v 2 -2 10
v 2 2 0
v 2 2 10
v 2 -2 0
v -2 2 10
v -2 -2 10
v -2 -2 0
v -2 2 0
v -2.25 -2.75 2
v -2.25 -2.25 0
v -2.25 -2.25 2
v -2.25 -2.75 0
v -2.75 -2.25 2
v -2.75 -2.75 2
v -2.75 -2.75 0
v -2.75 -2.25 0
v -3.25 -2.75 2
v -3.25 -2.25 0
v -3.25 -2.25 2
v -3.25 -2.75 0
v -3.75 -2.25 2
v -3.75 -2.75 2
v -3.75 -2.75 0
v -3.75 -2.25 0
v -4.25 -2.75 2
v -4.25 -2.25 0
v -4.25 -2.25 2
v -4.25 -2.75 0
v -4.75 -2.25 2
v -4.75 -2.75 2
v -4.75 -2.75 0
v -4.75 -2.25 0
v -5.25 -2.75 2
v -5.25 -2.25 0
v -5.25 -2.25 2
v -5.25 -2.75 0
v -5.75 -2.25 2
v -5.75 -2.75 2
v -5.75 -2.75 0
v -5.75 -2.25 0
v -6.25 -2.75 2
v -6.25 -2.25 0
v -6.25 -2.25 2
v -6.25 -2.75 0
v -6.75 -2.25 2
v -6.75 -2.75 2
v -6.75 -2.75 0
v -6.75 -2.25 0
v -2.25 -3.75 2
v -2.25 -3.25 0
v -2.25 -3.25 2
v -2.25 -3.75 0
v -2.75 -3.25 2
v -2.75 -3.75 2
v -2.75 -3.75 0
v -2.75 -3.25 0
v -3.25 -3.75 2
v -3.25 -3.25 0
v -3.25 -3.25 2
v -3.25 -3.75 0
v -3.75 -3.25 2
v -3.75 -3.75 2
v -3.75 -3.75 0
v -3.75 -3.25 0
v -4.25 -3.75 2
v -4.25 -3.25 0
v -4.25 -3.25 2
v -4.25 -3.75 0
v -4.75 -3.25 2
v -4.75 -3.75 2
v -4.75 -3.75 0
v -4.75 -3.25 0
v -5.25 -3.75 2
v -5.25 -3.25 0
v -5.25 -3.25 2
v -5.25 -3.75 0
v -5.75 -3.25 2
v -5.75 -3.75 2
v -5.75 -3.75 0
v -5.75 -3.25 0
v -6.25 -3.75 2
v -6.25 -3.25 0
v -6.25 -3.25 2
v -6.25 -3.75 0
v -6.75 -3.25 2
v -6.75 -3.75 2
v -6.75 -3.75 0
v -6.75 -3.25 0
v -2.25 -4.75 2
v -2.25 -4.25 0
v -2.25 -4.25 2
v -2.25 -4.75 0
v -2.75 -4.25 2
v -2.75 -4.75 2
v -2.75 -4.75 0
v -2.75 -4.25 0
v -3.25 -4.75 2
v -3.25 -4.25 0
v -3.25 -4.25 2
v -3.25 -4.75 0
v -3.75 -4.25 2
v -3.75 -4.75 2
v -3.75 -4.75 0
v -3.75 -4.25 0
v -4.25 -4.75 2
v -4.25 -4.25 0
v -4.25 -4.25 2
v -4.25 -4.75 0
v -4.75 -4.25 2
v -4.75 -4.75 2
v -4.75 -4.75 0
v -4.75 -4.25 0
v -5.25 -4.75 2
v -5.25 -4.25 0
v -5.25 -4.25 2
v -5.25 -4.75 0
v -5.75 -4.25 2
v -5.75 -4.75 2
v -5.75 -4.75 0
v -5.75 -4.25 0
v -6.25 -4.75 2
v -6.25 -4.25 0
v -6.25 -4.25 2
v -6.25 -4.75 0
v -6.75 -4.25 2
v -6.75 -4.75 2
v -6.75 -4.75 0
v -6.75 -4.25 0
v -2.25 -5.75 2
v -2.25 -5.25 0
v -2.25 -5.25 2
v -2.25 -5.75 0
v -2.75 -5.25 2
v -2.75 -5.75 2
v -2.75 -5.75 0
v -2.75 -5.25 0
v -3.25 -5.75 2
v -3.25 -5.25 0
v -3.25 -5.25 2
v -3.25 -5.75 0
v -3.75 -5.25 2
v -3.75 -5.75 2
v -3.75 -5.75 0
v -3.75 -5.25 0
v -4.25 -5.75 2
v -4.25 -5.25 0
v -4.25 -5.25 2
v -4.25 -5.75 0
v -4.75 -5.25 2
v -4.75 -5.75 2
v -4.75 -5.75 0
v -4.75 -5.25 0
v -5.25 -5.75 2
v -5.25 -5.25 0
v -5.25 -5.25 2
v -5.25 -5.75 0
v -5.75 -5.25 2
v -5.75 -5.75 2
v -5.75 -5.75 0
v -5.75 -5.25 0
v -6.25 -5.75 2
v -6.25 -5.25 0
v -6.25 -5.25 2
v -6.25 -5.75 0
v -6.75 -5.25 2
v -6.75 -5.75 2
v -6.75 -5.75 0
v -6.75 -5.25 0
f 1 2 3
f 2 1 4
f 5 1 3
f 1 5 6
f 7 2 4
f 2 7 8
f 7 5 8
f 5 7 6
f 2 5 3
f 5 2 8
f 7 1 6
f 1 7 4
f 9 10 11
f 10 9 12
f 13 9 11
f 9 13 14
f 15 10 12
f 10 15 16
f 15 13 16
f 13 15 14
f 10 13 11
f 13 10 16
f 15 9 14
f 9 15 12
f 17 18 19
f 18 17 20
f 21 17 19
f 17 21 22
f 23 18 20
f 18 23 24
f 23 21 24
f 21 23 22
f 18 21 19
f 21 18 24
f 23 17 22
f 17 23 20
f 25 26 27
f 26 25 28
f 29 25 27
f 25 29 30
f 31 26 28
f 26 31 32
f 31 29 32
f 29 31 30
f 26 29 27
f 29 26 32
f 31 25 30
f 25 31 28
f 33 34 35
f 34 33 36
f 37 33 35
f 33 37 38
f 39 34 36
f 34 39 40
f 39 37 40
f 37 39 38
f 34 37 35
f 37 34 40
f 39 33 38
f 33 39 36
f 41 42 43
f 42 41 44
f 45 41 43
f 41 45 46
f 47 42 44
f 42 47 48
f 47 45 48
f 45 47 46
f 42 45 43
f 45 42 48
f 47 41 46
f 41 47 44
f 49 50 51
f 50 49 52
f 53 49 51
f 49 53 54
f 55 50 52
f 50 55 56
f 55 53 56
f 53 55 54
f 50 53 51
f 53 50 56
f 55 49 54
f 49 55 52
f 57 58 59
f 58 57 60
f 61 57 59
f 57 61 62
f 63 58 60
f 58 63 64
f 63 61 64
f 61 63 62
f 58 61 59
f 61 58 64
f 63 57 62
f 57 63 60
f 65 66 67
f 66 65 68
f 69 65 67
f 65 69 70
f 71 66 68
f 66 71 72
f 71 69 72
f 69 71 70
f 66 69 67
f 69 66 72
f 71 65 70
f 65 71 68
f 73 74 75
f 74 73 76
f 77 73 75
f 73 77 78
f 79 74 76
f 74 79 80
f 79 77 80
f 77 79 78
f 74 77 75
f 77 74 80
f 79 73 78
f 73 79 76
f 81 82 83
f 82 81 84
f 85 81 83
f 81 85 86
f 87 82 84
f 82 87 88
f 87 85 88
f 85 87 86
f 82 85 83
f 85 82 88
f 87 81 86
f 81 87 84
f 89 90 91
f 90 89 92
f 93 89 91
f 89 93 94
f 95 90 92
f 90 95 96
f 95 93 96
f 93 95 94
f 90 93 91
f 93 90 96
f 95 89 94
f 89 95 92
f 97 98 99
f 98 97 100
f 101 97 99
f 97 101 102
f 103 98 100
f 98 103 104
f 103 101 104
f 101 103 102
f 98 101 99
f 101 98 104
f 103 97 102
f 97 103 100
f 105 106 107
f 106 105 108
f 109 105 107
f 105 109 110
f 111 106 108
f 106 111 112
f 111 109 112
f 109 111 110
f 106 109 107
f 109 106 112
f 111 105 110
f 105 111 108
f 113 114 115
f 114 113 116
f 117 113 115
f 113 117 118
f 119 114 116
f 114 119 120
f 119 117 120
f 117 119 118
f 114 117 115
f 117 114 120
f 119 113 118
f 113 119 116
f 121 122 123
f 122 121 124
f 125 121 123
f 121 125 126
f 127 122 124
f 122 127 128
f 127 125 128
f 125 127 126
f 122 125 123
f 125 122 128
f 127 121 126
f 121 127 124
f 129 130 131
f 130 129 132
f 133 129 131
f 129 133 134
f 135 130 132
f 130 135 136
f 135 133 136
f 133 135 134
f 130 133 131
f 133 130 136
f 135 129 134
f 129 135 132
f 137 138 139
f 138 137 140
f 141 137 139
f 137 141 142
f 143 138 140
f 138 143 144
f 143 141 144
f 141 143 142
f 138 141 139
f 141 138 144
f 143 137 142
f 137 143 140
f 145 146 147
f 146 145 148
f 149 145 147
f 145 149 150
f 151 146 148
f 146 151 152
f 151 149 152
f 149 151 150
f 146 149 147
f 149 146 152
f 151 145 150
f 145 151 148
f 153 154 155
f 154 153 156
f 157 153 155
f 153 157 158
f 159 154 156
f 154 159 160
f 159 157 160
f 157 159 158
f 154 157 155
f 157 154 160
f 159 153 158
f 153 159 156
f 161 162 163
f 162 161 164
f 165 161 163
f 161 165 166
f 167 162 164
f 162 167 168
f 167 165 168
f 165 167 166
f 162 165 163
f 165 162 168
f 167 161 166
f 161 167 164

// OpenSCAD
translate([0, 0, 5]) color([0,1,0,0.9]) cube([4, 4, 10], center=true);
translate([-2.5, -2.5, 1]) color([1,0,0]) cube([0.5, 0.5, 2], center=true);
translate([-3.5, -2.5, 1]) color([1,0,0]) cube([0.5, 0.5, 2], center=true);
translate([-4.5, -2.5, 1]) color([1,0,0]) cube([0.5, 0.5, 2], center=true);
translate([-5.5, -2.5, 1]) color([1,0,0]) cube([0.5, 0.5, 2], center=true);
translate([-6.5, -2.5, 1]) color([1,0,0]) cube([0.5, 0.5, 2], center=true);
translate([-2.5, -3.5, 1]) color([1,0,0]) cube([0.5, 0.5, 2], center=true);
translate([-3.5, -3.5, 1]) color([1,0,0]) cube([0.5, 0.5, 2], center=true);
translate([-4.5, -3.5, 1]) color([1,0,0]) cube([0.5, 0.5, 2], center=true);
translate([-5.5, -3.5, 1]) color([1,0,0]) cube([0.5, 0.5, 2], center=true);
translate([-6.5, -3.5, 1]) color([1,0,0]) cube([0.5, 0.5, 2], center=true);
translate([-2.5, -4.5, 1]) color([1,0,0]) cube([0.5, 0.5, 2], center=true);
translate([-3.5, -4.5, 1]) color([1,0,0]) cube([0.5, 0.5, 2], center=true);
translate([-4.5, -4.5, 1]) color([1,0,0]) cube([0.5, 0.5, 2], center=true);
translate([-5.5, -4.5, 1]) color([1,0,0]) cube([0.5, 0.5, 2], center=true);
translate([-6.5, -4.5, 1]) color([1,0,0]) cube([0.5, 0.5, 2], center=true);
translate([-2.5, -5.5, 1]) color([1,0,0]) cube([0.5, 0.5, 2], center=true);
translate([-3.5, -5.5, 1]) color([1,0,0]) cube([0.5, 0.5, 2], center=true);
translate([-4.5, -5.5, 1]) color([1,0,0]) cube([0.5, 0.5, 2], center=true);
translate([-5.5, -5.5, 1]) color([1,0,0]) cube([0.5, 0.5, 2], center=true);
translate([-6.5, -5.5, 1]) color([1,0,0]) cube([0.5, 0.5, 2], center=true);
